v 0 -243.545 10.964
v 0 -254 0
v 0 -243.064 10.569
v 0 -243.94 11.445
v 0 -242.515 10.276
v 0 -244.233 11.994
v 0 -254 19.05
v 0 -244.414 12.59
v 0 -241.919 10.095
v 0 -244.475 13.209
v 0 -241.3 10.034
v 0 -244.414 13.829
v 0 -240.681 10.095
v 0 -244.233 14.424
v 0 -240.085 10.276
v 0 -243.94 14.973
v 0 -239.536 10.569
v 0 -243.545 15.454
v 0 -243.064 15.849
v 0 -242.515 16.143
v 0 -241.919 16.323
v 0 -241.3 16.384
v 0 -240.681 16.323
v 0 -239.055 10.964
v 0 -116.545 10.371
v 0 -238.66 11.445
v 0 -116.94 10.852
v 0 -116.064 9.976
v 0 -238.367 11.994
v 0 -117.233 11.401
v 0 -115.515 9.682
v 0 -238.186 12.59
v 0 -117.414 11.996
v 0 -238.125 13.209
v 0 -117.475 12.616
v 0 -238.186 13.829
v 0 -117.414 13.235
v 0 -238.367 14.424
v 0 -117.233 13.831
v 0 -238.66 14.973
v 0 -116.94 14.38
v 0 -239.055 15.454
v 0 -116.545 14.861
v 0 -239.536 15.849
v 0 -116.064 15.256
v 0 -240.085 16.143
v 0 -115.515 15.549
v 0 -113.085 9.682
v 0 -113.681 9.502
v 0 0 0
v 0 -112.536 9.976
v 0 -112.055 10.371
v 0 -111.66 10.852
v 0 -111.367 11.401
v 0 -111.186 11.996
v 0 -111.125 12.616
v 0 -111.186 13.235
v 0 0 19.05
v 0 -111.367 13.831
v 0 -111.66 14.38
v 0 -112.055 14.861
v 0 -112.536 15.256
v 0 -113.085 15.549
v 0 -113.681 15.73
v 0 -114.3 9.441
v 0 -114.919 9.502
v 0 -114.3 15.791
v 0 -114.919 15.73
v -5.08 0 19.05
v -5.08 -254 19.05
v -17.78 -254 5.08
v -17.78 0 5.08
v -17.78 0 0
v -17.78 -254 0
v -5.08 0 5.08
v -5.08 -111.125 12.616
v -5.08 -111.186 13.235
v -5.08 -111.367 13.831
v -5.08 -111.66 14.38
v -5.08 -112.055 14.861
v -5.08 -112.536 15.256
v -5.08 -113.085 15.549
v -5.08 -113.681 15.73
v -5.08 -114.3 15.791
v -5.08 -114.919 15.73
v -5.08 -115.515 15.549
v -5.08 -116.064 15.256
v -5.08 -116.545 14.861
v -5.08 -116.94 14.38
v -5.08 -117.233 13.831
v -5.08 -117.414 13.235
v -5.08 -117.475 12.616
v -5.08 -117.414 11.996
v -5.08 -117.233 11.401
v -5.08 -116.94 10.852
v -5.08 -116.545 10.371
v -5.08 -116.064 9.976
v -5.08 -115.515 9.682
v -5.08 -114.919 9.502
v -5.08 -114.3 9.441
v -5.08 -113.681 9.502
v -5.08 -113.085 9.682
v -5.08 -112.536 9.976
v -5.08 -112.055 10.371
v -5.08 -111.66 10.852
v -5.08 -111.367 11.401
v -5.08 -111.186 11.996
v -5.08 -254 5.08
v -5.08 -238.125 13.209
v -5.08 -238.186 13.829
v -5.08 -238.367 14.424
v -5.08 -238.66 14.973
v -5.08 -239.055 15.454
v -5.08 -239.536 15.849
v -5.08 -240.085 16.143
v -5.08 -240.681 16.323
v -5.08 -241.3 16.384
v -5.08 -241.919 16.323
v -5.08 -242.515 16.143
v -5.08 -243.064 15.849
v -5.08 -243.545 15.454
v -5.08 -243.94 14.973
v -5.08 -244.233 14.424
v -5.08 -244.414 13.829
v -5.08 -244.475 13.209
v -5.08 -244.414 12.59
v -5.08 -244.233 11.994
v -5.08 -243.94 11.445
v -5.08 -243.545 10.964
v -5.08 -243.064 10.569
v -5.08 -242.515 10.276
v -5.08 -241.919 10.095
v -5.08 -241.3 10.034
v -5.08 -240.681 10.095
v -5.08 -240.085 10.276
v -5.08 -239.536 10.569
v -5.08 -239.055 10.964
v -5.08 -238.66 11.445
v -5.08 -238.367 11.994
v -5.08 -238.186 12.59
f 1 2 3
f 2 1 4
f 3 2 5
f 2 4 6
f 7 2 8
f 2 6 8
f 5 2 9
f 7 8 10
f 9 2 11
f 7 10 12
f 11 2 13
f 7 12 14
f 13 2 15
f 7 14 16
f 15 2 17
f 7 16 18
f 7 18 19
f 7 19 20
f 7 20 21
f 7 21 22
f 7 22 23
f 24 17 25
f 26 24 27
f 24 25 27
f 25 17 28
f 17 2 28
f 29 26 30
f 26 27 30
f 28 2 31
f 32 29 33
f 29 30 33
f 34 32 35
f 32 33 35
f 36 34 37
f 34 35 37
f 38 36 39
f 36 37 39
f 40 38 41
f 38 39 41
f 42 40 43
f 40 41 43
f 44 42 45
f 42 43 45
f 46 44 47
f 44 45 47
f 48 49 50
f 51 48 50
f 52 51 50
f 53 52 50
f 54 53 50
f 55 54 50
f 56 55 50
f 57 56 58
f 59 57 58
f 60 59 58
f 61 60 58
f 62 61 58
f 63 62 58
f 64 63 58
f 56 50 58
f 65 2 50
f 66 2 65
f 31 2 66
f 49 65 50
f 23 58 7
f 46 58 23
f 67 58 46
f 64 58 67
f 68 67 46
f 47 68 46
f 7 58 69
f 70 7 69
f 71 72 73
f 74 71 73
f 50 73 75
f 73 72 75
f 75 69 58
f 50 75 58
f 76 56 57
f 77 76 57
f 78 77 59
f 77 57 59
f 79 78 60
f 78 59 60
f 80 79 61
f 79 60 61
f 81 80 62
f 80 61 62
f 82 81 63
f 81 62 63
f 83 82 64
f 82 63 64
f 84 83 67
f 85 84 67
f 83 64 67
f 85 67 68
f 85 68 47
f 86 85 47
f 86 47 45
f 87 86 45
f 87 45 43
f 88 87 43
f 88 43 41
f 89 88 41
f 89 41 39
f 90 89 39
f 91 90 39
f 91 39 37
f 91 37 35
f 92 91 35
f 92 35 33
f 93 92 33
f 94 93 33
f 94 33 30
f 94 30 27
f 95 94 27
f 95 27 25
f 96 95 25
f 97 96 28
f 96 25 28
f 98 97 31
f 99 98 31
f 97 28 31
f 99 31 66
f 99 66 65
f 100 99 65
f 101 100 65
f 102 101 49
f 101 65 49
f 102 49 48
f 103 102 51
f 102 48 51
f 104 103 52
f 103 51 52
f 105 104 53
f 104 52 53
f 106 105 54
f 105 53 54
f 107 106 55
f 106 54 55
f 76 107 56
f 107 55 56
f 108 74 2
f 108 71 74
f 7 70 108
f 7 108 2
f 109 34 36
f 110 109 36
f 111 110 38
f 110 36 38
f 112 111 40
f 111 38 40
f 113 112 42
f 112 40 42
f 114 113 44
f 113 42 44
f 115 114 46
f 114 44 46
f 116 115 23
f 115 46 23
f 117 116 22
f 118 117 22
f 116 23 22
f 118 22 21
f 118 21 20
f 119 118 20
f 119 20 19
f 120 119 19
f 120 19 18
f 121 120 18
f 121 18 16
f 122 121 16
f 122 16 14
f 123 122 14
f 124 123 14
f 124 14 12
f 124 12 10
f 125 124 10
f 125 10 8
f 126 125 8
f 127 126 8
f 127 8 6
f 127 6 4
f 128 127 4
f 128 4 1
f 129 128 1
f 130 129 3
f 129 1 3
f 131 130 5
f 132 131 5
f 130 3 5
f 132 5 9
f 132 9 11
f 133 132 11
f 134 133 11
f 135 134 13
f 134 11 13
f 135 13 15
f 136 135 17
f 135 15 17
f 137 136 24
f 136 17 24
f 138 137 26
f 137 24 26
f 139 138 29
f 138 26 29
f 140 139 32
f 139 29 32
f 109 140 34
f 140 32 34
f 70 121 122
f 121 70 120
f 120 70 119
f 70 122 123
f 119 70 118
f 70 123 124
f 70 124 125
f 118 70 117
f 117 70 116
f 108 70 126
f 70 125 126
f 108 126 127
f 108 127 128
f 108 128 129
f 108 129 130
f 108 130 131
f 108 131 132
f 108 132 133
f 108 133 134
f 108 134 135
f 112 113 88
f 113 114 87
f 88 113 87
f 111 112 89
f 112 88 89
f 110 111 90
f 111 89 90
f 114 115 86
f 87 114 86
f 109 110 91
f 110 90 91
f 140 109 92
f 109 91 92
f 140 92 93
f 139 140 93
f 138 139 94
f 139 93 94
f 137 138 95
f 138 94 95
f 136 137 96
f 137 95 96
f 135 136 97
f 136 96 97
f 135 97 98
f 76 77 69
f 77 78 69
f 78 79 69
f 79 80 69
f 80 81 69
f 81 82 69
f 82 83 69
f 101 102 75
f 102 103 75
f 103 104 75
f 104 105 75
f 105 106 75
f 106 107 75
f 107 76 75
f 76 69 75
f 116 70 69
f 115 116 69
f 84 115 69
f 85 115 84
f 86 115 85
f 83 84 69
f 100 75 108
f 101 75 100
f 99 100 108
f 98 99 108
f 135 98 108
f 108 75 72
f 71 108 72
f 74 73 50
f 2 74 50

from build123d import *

# Parameters (mm, degrees)
F1_DEPTH = 254
F2_R     = 3.175
F3_DEPTH = 25.4


with BuildPart() as f1:
    # F0 (on Front) → F1 (new body)
    with BuildSketch(Plane.XZ):
        Polygon((-17.78, 0), (0, 0), (0, 19.05), (-5.08, 19.05), (-5.08, 5.08), (-17.78, 5.08), align=None)
    extrude(amount=F1_DEPTH)

    # F2 (on face) → F3 (cut)
    with BuildSketch(Plane.YZ):
        with Locations((-241.3, 13.209414)):
            Circle(F2_R)
        with Locations((-114.3, 12.615733)):
            Circle(F2_R)
    extrude(amount=-F3_DEPTH, mode=Mode.SUBTRACT)


solid = f1.part
